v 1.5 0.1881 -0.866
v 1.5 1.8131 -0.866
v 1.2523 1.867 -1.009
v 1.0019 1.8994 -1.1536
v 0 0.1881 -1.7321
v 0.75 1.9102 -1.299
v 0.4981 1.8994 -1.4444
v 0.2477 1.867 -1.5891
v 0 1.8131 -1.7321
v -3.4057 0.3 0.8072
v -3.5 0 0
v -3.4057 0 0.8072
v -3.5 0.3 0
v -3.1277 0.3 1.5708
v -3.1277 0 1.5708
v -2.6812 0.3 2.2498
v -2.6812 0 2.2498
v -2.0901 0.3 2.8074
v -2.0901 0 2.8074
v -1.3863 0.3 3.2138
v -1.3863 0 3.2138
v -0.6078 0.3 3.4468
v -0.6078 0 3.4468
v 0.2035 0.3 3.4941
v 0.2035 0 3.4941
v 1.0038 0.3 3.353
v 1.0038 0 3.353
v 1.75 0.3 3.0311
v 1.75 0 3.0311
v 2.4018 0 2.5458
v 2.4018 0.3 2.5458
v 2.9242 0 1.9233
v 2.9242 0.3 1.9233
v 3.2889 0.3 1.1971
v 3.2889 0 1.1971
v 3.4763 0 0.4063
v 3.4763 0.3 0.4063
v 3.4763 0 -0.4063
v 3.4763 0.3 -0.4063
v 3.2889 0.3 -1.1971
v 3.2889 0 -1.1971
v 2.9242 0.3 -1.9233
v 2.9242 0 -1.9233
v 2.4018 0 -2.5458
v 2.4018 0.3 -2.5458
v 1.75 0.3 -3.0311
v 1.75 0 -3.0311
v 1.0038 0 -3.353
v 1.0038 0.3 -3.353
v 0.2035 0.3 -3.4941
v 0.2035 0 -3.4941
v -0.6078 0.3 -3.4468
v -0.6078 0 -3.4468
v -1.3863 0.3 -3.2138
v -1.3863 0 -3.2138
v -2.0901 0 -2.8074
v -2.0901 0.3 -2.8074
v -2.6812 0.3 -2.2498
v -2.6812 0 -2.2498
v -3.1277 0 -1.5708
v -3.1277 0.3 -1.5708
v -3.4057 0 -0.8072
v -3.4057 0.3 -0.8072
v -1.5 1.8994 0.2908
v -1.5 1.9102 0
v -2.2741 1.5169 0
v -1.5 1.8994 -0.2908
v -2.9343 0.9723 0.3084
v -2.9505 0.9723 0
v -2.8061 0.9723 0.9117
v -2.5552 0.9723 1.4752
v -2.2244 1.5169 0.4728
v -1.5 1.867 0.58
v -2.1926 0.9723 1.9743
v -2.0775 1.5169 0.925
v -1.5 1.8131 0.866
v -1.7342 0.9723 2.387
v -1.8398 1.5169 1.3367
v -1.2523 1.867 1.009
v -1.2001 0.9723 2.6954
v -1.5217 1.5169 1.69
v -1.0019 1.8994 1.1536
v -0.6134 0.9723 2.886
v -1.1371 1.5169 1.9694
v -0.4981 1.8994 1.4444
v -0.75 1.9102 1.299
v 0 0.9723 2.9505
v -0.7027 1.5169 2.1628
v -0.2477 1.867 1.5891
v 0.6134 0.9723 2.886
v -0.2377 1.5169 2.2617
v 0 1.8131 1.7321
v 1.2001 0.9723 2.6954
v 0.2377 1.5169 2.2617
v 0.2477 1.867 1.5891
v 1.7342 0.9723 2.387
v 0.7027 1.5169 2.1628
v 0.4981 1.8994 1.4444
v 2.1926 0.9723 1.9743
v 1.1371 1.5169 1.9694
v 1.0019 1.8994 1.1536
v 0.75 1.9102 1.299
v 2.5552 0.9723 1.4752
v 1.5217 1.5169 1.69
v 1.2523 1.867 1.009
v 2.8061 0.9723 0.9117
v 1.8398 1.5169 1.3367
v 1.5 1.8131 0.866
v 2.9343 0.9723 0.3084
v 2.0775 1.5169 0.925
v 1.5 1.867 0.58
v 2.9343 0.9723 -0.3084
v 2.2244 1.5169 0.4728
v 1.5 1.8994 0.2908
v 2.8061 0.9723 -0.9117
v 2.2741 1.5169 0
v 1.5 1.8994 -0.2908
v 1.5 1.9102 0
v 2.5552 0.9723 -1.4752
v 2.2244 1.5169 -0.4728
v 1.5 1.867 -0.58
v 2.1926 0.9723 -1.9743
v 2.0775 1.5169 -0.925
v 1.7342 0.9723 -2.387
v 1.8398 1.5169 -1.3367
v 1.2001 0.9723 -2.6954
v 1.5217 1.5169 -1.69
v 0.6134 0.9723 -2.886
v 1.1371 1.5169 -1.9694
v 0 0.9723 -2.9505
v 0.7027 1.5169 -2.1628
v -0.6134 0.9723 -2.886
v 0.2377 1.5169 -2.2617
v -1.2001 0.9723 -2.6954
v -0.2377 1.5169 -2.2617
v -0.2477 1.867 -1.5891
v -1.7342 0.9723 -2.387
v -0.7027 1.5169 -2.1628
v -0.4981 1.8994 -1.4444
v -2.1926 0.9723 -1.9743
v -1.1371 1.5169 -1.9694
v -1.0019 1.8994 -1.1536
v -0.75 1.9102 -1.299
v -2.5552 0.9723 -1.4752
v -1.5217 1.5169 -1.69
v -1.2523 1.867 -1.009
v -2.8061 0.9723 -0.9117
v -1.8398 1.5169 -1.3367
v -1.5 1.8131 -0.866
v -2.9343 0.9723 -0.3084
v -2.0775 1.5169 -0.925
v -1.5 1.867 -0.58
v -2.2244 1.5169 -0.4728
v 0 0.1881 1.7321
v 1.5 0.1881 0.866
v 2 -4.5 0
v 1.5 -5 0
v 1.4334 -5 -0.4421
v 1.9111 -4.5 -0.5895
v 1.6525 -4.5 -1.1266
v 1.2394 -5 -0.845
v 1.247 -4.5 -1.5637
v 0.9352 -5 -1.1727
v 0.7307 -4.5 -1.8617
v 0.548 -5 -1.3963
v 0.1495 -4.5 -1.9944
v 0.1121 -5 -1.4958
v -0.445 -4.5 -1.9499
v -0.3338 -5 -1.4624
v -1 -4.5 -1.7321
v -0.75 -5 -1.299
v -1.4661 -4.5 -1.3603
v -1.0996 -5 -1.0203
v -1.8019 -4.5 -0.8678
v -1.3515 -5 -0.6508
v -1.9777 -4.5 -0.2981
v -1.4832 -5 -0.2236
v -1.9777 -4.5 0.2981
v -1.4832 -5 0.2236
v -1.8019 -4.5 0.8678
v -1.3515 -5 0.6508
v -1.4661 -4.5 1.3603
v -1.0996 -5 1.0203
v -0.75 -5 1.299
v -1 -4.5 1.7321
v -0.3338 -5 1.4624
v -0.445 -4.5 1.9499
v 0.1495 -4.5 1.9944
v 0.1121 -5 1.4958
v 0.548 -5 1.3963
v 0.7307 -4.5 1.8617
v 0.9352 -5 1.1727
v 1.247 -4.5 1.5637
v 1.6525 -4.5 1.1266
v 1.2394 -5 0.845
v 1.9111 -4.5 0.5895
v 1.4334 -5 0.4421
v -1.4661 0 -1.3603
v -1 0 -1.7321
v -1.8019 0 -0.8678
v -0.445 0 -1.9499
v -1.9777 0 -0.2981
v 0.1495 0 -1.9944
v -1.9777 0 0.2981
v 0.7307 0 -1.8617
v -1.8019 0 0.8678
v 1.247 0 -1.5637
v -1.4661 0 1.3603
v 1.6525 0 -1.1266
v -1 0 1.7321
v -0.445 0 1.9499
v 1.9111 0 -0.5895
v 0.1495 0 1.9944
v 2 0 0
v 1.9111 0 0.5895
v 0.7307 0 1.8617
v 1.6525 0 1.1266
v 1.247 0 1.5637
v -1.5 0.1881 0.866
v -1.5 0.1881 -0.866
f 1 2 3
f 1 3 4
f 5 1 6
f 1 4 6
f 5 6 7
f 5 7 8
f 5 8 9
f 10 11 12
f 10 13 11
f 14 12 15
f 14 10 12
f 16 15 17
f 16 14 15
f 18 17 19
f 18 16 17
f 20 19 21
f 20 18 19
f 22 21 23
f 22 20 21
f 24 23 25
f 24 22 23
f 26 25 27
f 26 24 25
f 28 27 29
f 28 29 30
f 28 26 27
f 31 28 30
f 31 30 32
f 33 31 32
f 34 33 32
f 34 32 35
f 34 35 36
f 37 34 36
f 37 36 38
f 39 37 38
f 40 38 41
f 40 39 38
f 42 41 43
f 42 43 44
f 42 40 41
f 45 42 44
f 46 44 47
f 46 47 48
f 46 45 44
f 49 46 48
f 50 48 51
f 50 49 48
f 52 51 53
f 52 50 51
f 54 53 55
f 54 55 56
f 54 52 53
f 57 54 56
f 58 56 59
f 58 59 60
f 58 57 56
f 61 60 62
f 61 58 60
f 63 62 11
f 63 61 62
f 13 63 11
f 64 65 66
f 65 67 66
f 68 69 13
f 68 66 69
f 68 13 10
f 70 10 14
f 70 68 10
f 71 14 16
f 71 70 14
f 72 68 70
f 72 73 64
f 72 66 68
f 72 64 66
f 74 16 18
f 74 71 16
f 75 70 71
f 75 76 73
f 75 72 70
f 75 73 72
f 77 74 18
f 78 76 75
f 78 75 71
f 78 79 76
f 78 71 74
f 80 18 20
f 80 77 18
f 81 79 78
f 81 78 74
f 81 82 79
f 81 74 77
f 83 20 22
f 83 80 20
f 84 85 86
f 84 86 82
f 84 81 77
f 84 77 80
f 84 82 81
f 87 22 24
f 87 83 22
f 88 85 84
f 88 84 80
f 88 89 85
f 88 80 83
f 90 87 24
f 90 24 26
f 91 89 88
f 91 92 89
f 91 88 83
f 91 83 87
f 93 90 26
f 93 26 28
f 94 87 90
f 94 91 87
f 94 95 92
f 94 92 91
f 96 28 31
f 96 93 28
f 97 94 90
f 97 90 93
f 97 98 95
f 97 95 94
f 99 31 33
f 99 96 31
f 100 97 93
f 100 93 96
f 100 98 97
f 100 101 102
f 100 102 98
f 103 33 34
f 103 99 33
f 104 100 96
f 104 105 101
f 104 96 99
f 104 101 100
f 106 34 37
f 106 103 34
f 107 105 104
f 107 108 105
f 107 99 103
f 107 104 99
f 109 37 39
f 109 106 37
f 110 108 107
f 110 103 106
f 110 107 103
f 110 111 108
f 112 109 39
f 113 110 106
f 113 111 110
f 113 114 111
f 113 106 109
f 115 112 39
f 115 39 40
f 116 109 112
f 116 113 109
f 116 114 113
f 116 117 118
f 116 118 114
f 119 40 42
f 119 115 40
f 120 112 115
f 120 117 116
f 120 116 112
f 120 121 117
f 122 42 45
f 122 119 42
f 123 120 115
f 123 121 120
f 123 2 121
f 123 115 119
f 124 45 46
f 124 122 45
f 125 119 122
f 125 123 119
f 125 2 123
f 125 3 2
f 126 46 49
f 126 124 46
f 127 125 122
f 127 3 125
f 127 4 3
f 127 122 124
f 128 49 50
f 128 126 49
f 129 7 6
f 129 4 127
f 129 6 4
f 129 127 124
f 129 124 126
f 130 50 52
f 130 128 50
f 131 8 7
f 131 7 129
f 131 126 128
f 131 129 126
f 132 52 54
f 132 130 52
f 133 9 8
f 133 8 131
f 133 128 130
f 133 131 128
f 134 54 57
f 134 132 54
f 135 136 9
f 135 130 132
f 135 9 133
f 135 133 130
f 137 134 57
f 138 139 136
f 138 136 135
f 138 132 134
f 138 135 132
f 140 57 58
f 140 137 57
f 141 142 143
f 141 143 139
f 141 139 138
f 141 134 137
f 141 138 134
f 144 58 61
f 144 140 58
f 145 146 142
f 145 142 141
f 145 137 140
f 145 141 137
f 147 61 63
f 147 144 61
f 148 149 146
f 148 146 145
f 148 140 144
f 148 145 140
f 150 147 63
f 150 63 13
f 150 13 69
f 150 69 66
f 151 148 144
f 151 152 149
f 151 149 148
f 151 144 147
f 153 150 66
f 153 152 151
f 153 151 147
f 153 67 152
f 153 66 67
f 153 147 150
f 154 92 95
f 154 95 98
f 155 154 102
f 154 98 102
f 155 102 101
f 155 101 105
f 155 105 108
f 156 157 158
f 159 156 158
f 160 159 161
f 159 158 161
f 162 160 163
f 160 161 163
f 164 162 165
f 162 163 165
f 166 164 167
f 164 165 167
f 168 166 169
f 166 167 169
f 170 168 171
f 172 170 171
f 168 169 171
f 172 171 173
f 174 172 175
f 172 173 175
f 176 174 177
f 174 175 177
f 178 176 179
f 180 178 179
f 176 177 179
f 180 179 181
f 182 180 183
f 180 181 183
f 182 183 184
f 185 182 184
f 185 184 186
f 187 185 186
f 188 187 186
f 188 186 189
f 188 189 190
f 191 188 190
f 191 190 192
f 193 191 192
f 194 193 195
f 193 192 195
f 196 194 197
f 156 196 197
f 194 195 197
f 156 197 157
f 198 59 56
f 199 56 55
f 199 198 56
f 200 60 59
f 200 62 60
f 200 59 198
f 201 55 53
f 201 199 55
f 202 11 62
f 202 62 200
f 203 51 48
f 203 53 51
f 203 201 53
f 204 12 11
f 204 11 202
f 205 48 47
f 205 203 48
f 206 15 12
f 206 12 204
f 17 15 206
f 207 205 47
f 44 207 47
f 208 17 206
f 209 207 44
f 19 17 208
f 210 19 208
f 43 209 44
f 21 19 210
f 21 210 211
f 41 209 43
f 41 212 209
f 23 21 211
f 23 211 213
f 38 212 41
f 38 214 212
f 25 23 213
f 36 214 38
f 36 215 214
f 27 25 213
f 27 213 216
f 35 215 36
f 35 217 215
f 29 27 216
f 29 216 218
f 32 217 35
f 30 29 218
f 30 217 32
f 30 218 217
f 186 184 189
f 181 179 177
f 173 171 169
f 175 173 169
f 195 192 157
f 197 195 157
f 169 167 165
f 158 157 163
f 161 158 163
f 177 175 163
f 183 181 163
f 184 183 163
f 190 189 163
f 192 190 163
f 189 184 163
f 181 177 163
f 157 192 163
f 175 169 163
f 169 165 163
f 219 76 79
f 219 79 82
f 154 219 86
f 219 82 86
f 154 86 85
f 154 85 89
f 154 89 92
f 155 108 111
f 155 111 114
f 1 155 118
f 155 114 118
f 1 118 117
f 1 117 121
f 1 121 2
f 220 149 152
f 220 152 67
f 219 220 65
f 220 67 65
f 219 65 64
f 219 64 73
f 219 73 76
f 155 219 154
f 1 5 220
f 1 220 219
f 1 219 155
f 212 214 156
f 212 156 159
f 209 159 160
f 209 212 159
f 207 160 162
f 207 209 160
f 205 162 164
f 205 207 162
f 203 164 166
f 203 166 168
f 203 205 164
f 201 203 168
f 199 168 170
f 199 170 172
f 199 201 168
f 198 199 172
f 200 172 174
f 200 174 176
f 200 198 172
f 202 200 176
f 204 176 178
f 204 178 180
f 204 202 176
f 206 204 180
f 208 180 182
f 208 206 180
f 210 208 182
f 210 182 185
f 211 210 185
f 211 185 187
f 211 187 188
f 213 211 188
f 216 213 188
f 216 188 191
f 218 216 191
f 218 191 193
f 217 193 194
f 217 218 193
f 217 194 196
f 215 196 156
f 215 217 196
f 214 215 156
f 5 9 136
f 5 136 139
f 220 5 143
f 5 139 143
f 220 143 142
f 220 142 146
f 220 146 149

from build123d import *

# Parameters (mm, degrees)
SKETCH1_R           = 2
BOSS_EXTRUDE3_DEPTH = 5
CHAMFER2_SIZE       = 0.5
CUT_EXTRUDE2_DEPTH  = 2


with BuildPart() as part:
    # Sketch1 → Boss-Extrude3 (new body)
    with BuildSketch(Plane(origin=(0, 0, 0), x_dir=(1, 0, 0), z_dir=(0, 1, 0))):
        Circle(SKETCH1_R)
    extrude(amount=-BOSS_EXTRUDE3_DEPTH)

    # Sketch3 → Revolve2 (revolve)
    with BuildSketch(Plane.XY):
        with BuildLine():
            Line((-3.5, 0), (-3.5, 0.3))
            ThreePointArc((-3.5, 0.3), (-1.988393808, 1.6859585), (0, 2.188078318))
            Line((0, 2.188078318), (0, 0))
            Line((0, 0), (-3.5, 0))
        make_face()
    revolve(axis=Axis((0, -2, 0), (0, 1, 0)))

    # Chamfer2
    chamfer2_edges = [part.edges().sort_by_distance(p)[0] for p in [
        (-2, -5, 0),
    ]]
    chamfer(chamfer2_edges, length=CHAMFER2_SIZE)

    # Sketch4 → Cut-Extrude2 (cut)
    with BuildSketch(Plane(origin=(0, 2.188078318, 0), x_dir=(1, 0, 0), z_dir=(0, 1, 0))):
        Polygon((0, 1.732050808), (-1.5, 0.866025404), (-1.5, -0.866025404), (0, -1.732050808), (1.5, -0.866025404), (1.5, 0.866025404), align=None)
    extrude(amount=-CUT_EXTRUDE2_DEPTH, mode=Mode.SUBTRACT)


solid = part.part
